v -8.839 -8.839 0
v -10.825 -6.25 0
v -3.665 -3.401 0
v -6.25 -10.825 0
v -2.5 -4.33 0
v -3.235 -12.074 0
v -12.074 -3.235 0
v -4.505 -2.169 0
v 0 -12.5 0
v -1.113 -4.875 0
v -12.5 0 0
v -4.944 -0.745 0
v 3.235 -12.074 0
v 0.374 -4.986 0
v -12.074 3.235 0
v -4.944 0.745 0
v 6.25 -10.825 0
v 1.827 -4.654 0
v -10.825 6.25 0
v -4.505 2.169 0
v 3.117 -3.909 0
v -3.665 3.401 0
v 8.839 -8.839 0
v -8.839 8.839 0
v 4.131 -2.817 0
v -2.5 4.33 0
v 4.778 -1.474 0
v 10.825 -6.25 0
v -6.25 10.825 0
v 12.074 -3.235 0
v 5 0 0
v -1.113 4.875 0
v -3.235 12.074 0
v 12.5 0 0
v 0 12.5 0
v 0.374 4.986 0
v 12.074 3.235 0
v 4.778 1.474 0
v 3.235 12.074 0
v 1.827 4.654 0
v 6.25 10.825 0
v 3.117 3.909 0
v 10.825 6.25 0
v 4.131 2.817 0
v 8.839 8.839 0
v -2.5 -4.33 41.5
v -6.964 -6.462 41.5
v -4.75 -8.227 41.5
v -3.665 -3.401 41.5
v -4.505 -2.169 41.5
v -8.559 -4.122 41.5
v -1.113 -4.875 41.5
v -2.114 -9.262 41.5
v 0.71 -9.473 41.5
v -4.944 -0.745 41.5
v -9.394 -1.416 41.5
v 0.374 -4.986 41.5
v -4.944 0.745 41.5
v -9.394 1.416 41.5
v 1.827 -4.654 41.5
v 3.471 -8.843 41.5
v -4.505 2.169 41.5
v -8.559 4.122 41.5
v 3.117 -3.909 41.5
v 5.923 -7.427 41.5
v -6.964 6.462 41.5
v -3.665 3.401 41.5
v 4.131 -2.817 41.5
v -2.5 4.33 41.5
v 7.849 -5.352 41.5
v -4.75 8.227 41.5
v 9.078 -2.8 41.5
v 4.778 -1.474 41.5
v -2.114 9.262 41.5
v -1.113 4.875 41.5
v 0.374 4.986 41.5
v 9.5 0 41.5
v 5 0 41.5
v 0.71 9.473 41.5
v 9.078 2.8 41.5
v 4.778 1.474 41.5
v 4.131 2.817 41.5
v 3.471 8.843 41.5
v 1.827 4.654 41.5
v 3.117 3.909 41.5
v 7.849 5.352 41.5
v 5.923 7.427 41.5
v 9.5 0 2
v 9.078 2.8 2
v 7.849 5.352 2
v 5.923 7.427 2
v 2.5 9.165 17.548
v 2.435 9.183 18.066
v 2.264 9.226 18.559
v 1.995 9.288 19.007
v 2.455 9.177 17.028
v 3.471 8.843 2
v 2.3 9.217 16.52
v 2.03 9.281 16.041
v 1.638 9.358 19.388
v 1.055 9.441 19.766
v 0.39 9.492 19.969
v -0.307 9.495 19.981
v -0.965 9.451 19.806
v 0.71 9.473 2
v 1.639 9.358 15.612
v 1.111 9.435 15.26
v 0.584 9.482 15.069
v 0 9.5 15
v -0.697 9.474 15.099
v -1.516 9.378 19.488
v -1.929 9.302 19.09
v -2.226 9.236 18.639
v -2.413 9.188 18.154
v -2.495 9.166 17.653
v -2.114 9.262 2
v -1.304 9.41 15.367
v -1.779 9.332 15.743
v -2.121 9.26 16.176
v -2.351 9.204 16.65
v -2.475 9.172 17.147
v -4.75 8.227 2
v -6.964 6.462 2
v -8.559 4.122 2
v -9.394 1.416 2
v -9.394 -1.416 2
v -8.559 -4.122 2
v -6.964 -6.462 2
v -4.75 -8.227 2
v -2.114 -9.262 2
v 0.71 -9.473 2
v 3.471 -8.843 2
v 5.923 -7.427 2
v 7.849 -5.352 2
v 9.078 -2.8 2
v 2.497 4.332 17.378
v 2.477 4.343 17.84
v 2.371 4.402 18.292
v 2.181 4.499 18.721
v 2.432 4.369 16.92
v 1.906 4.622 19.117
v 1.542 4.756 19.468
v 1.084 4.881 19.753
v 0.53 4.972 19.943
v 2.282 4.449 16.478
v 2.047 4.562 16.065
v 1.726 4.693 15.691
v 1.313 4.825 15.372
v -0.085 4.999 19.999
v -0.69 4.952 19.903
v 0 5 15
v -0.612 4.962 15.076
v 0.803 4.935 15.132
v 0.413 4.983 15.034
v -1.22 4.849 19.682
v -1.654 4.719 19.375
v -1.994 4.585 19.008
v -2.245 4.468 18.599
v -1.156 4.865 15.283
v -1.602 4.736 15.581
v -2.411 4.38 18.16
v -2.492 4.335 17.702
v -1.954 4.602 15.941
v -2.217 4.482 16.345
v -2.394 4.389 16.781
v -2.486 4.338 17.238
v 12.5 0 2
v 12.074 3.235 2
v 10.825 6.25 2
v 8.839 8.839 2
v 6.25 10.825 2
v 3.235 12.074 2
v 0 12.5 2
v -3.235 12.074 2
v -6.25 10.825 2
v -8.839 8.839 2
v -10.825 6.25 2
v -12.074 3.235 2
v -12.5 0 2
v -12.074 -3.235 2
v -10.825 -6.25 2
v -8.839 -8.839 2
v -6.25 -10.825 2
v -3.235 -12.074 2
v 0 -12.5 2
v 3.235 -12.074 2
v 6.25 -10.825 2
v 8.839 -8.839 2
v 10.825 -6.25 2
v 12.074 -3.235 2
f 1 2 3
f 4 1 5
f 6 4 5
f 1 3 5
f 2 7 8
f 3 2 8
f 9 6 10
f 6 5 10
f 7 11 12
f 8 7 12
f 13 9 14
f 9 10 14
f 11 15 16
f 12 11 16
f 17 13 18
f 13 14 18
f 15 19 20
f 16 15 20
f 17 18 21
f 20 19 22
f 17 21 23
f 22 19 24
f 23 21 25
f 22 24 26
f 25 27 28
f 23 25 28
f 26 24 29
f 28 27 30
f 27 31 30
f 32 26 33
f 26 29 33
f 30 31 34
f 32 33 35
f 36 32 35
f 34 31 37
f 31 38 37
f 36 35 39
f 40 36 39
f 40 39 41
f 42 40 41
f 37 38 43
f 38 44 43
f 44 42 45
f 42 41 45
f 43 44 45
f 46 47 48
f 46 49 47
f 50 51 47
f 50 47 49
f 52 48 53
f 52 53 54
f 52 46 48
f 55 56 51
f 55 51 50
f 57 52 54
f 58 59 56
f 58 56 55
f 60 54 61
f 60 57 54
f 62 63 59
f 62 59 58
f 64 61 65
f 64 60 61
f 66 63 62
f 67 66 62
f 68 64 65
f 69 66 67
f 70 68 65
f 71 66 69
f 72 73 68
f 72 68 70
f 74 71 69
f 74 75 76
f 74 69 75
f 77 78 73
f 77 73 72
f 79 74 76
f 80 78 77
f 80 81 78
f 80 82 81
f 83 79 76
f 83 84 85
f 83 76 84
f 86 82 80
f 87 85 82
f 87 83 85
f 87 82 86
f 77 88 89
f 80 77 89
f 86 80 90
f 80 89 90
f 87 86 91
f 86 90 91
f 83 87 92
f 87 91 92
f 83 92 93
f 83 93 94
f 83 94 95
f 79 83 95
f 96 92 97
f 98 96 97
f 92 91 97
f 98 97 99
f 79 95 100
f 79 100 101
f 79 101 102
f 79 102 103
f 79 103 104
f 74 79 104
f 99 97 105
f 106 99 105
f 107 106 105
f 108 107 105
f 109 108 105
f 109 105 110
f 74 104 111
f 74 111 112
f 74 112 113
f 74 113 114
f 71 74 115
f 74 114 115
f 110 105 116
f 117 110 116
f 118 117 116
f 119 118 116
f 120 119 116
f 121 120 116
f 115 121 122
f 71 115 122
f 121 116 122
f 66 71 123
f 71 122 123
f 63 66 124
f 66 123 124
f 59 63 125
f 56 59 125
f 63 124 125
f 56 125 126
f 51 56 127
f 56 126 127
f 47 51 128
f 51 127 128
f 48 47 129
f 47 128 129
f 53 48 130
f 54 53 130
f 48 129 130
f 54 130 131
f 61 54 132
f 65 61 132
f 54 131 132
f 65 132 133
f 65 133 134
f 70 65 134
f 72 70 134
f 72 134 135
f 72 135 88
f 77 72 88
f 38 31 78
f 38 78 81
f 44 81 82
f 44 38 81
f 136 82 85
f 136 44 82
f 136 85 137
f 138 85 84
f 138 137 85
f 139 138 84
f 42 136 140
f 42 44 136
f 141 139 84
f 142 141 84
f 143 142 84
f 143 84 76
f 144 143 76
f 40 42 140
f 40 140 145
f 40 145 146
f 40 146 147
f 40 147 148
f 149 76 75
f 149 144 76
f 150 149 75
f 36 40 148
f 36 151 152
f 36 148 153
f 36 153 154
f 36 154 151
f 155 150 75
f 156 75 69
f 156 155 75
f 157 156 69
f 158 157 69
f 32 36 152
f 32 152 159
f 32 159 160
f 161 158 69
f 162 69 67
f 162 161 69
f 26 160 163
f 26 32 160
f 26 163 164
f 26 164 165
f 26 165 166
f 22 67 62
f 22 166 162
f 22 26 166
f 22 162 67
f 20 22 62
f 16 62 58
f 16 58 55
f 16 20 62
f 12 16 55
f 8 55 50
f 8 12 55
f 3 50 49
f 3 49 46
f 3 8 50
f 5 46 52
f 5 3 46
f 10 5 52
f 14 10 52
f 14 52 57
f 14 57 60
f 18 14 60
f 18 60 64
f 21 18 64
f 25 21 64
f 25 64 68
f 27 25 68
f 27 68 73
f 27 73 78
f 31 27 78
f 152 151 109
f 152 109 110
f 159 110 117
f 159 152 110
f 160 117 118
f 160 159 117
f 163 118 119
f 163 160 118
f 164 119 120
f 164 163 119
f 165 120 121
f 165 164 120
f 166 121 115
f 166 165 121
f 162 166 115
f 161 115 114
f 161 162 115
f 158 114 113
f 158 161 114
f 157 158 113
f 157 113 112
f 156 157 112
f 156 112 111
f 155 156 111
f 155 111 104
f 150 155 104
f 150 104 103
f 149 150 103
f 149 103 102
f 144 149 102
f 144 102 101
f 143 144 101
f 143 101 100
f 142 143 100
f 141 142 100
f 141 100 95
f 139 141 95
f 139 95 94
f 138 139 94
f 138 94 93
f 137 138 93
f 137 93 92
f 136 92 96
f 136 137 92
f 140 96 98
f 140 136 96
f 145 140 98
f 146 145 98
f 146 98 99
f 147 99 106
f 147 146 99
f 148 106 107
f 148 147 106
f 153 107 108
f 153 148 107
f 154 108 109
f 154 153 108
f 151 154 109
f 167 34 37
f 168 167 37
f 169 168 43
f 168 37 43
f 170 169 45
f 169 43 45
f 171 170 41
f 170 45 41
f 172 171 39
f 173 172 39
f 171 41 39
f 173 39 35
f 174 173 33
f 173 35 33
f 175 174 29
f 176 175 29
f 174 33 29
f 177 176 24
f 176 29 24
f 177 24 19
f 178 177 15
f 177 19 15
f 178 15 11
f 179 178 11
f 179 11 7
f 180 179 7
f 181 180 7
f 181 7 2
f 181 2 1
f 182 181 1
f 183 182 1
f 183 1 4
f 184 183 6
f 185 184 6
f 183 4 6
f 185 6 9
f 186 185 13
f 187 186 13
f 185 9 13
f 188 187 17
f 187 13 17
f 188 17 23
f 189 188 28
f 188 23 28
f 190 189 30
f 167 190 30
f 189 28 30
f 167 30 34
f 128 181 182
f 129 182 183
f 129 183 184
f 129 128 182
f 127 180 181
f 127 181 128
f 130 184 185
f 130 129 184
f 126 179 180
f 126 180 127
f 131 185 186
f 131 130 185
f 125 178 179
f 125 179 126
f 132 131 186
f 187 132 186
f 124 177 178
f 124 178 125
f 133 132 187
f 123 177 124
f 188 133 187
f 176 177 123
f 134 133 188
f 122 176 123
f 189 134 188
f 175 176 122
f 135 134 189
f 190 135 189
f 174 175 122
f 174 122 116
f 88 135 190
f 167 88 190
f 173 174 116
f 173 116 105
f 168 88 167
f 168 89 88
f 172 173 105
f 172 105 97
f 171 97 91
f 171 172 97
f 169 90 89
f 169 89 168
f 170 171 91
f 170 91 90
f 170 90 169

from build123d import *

# Parameters (mm, degrees)
SKETCH1_R               = 12.5
SKETCH1_R_2             = 9.5
BOSS_EXTRUDE1_DEPTH     = 2
SKETCH1_3_R             = 9.5
SKETCH1_3_R_2           = 5
BOSS_EXTRUDE2_DEPTH     = 41.5
CUT_EXTRUDE1_REACH      = 47.108
CUT_EXTRUDE1_END_RADIUS = 9.5
SKETCH2_R               = 2.5


with BuildPart() as part:
    # Sketch1 → Boss-Extrude1 (new body)
    with BuildSketch(Plane.XY):
        Circle(SKETCH1_R)
        Circle(SKETCH1_R_2, mode=Mode.SUBTRACT)
    extrude(amount=BOSS_EXTRUDE1_DEPTH)

    # Sketch1<3> → Boss-Extrude2 (add)
    with BuildSketch(Plane.XY):
        Circle(SKETCH1_3_R)
        Circle(SKETCH1_3_R_2, mode=Mode.SUBTRACT)
    extrude(amount=BOSS_EXTRUDE2_DEPTH)

    # Cut-Extrude1: up to this cylinder (the profile starts inside it)
    cut_extrude1_end = Plane(origin=(0, 0, 17.5), z_dir=(0, 0, -1)) * Cylinder(CUT_EXTRUDE1_END_RADIUS, 114.216, mode=Mode.PRIVATE)
    # Sketch2 → Cut-Extrude1 (cut, up to the surface)
    with BuildSketch(Plane(origin=(0, 0, 0), x_dir=(1, 0, 0), z_dir=(0, 1, 0)), mode=Mode.PRIVATE) as cut_extrude1_sk1:
        with Locations(Location((0, -17.5, 0), (0, 0, 90))):
            Circle(SKETCH2_R)
    cut_extrude1_tool1 = extrude(cut_extrude1_sk1.sketch, amount=CUT_EXTRUDE1_REACH, mode=Mode.PRIVATE) & cut_extrude1_end
    add(cut_extrude1_tool1.solids().sort_by_distance((0, 0, 17.5))[0], mode=Mode.SUBTRACT)


solid = part.part
